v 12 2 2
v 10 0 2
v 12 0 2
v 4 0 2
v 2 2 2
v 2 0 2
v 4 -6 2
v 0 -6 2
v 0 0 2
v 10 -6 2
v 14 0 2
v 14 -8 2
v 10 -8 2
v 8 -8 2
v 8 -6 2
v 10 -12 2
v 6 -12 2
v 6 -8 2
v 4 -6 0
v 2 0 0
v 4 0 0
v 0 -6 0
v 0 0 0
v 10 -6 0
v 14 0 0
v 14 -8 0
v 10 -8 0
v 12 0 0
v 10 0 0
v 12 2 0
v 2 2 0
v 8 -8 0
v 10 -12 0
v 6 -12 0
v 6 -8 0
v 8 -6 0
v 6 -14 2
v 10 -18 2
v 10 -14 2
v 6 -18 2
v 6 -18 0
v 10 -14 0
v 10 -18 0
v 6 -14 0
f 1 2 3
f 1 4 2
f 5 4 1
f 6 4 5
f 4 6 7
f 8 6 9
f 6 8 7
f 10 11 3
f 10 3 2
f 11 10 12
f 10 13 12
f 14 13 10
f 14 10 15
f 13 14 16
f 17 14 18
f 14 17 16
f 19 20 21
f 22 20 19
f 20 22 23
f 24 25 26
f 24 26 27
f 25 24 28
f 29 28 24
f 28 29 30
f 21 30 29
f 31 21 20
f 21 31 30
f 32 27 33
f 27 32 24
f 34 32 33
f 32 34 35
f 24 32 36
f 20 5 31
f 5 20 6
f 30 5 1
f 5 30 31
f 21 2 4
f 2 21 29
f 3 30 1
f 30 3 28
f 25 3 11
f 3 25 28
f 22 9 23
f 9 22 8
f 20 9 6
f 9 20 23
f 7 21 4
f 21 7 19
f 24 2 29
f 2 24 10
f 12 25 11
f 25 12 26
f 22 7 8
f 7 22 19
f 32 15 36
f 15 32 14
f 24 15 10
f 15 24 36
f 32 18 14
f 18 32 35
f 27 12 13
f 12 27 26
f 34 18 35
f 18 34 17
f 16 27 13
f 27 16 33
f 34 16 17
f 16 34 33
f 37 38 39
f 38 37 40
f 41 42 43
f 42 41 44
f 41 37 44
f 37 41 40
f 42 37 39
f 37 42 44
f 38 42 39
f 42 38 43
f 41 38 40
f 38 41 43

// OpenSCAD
union() {
	translate(v = [0, 0, 0]) {
		translate(v = [2, 0, 0]) {
			color(alpha = 1.0, c = "white") {
				cube(size = 2);
			}
		}
	}
	translate(v = [0, 0, 0]) {
		translate(v = [4, 0, 0]) {
			color(alpha = 1.0, c = "white") {
				cube(size = 2);
			}
		}
	}
	translate(v = [0, 0, 0]) {
		translate(v = [6, 0, 0]) {
			color(alpha = 1.0, c = "white") {
				cube(size = 2);
			}
		}
	}
	translate(v = [0, 0, 0]) {
		translate(v = [8, 0, 0]) {
			color(alpha = 1.0, c = "white") {
				cube(size = 2);
			}
		}
	}
	translate(v = [0, 0, 0]) {
		translate(v = [10, 0, 0]) {
			color(alpha = 1.0, c = "white") {
				cube(size = 2);
			}
		}
	}
	translate(v = [0, -2, 0]) {
		translate(v = [0, 0, 0]) {
			color(alpha = 1.0, c = "white") {
				cube(size = 2);
			}
		}
	}
	translate(v = [0, -2, 0]) {
		translate(v = [2, 0, 0]) {
			color(alpha = 1.0, c = "white") {
				cube(size = 2);
			}
		}
	}
	translate(v = [0, -2, 0]) {
		translate(v = [10, 0, 0]) {
			color(alpha = 1.0, c = "white") {
				cube(size = 2);
			}
		}
	}
	translate(v = [0, -2, 0]) {
		translate(v = [12, 0, 0]) {
			color(alpha = 1.0, c = "white") {
				cube(size = 2);
			}
		}
	}
	translate(v = [0, -4, 0]) {
		translate(v = [0, 0, 0]) {
			color(alpha = 1.0, c = "white") {
				cube(size = 2);
			}
		}
	}
	translate(v = [0, -4, 0]) {
		translate(v = [2, 0, 0]) {
			color(alpha = 1.0, c = "white") {
				cube(size = 2);
			}
		}
	}
	translate(v = [0, -4, 0]) {
		translate(v = [10, 0, 0]) {
			color(alpha = 1.0, c = "white") {
				cube(size = 2);
			}
		}
	}
	translate(v = [0, -4, 0]) {
		translate(v = [12, 0, 0]) {
			color(alpha = 1.0, c = "white") {
				cube(size = 2);
			}
		}
	}
	translate(v = [0, -6, 0]) {
		translate(v = [0, 0, 0]) {
			color(alpha = 1.0, c = "white") {
				cube(size = 2);
			}
		}
	}
	translate(v = [0, -6, 0]) {
		translate(v = [2, 0, 0]) {
			color(alpha = 1.0, c = "white") {
				cube(size = 2);
			}
		}
	}
	translate(v = [0, -6, 0]) {
		translate(v = [10, 0, 0]) {
			color(alpha = 1.0, c = "white") {
				cube(size = 2);
			}
		}
	}
	translate(v = [0, -6, 0]) {
		translate(v = [12, 0, 0]) {
			color(alpha = 1.0, c = "white") {
				cube(size = 2);
			}
		}
	}
	translate(v = [0, -8, 0]) {
		translate(v = [8, 0, 0]) {
			color(alpha = 1.0, c = "white") {
				cube(size = 2);
			}
		}
	}
	translate(v = [0, -8, 0]) {
		translate(v = [10, 0, 0]) {
			color(alpha = 1.0, c = "white") {
				cube(size = 2);
			}
		}
	}
	translate(v = [0, -8, 0]) {
		translate(v = [12, 0, 0]) {
			color(alpha = 1.0, c = "white") {
				cube(size = 2);
			}
		}
	}
	translate(v = [0, -10, 0]) {
		translate(v = [6, 0, 0]) {
			color(alpha = 1.0, c = "white") {
				cube(size = 2);
			}
		}
	}
	translate(v = [0, -10, 0]) {
		translate(v = [8, 0, 0]) {
			color(alpha = 1.0, c = "white") {
				cube(size = 2);
			}
		}
	}
	translate(v = [0, -12, 0]) {
		translate(v = [6, 0, 0]) {
			color(alpha = 1.0, c = "white") {
				cube(size = 2);
			}
		}
	}
	translate(v = [0, -12, 0]) {
		translate(v = [8, 0, 0]) {
			color(alpha = 1.0, c = "white") {
				cube(size = 2);
			}
		}
	}
	translate(v = [0, -16, 0]) {
		translate(v = [6, 0, 0]) {
			color(alpha = 1.0, c = "white") {
				cube(size = 2);
			}
		}
	}
	translate(v = [0, -16, 0]) {
		translate(v = [8, 0, 0]) {
			color(alpha = 1.0, c = "white") {
				cube(size = 2);
			}
		}
	}
	translate(v = [0, -18, 0]) {
		translate(v = [6, 0, 0]) {
			color(alpha = 1.0, c = "white") {
				cube(size = 2);
			}
		}
	}
	translate(v = [0, -18, 0]) {
		translate(v = [8, 0, 0]) {
			color(alpha = 1.0, c = "white") {
				cube(size = 2);
			}
		}
	}
}
